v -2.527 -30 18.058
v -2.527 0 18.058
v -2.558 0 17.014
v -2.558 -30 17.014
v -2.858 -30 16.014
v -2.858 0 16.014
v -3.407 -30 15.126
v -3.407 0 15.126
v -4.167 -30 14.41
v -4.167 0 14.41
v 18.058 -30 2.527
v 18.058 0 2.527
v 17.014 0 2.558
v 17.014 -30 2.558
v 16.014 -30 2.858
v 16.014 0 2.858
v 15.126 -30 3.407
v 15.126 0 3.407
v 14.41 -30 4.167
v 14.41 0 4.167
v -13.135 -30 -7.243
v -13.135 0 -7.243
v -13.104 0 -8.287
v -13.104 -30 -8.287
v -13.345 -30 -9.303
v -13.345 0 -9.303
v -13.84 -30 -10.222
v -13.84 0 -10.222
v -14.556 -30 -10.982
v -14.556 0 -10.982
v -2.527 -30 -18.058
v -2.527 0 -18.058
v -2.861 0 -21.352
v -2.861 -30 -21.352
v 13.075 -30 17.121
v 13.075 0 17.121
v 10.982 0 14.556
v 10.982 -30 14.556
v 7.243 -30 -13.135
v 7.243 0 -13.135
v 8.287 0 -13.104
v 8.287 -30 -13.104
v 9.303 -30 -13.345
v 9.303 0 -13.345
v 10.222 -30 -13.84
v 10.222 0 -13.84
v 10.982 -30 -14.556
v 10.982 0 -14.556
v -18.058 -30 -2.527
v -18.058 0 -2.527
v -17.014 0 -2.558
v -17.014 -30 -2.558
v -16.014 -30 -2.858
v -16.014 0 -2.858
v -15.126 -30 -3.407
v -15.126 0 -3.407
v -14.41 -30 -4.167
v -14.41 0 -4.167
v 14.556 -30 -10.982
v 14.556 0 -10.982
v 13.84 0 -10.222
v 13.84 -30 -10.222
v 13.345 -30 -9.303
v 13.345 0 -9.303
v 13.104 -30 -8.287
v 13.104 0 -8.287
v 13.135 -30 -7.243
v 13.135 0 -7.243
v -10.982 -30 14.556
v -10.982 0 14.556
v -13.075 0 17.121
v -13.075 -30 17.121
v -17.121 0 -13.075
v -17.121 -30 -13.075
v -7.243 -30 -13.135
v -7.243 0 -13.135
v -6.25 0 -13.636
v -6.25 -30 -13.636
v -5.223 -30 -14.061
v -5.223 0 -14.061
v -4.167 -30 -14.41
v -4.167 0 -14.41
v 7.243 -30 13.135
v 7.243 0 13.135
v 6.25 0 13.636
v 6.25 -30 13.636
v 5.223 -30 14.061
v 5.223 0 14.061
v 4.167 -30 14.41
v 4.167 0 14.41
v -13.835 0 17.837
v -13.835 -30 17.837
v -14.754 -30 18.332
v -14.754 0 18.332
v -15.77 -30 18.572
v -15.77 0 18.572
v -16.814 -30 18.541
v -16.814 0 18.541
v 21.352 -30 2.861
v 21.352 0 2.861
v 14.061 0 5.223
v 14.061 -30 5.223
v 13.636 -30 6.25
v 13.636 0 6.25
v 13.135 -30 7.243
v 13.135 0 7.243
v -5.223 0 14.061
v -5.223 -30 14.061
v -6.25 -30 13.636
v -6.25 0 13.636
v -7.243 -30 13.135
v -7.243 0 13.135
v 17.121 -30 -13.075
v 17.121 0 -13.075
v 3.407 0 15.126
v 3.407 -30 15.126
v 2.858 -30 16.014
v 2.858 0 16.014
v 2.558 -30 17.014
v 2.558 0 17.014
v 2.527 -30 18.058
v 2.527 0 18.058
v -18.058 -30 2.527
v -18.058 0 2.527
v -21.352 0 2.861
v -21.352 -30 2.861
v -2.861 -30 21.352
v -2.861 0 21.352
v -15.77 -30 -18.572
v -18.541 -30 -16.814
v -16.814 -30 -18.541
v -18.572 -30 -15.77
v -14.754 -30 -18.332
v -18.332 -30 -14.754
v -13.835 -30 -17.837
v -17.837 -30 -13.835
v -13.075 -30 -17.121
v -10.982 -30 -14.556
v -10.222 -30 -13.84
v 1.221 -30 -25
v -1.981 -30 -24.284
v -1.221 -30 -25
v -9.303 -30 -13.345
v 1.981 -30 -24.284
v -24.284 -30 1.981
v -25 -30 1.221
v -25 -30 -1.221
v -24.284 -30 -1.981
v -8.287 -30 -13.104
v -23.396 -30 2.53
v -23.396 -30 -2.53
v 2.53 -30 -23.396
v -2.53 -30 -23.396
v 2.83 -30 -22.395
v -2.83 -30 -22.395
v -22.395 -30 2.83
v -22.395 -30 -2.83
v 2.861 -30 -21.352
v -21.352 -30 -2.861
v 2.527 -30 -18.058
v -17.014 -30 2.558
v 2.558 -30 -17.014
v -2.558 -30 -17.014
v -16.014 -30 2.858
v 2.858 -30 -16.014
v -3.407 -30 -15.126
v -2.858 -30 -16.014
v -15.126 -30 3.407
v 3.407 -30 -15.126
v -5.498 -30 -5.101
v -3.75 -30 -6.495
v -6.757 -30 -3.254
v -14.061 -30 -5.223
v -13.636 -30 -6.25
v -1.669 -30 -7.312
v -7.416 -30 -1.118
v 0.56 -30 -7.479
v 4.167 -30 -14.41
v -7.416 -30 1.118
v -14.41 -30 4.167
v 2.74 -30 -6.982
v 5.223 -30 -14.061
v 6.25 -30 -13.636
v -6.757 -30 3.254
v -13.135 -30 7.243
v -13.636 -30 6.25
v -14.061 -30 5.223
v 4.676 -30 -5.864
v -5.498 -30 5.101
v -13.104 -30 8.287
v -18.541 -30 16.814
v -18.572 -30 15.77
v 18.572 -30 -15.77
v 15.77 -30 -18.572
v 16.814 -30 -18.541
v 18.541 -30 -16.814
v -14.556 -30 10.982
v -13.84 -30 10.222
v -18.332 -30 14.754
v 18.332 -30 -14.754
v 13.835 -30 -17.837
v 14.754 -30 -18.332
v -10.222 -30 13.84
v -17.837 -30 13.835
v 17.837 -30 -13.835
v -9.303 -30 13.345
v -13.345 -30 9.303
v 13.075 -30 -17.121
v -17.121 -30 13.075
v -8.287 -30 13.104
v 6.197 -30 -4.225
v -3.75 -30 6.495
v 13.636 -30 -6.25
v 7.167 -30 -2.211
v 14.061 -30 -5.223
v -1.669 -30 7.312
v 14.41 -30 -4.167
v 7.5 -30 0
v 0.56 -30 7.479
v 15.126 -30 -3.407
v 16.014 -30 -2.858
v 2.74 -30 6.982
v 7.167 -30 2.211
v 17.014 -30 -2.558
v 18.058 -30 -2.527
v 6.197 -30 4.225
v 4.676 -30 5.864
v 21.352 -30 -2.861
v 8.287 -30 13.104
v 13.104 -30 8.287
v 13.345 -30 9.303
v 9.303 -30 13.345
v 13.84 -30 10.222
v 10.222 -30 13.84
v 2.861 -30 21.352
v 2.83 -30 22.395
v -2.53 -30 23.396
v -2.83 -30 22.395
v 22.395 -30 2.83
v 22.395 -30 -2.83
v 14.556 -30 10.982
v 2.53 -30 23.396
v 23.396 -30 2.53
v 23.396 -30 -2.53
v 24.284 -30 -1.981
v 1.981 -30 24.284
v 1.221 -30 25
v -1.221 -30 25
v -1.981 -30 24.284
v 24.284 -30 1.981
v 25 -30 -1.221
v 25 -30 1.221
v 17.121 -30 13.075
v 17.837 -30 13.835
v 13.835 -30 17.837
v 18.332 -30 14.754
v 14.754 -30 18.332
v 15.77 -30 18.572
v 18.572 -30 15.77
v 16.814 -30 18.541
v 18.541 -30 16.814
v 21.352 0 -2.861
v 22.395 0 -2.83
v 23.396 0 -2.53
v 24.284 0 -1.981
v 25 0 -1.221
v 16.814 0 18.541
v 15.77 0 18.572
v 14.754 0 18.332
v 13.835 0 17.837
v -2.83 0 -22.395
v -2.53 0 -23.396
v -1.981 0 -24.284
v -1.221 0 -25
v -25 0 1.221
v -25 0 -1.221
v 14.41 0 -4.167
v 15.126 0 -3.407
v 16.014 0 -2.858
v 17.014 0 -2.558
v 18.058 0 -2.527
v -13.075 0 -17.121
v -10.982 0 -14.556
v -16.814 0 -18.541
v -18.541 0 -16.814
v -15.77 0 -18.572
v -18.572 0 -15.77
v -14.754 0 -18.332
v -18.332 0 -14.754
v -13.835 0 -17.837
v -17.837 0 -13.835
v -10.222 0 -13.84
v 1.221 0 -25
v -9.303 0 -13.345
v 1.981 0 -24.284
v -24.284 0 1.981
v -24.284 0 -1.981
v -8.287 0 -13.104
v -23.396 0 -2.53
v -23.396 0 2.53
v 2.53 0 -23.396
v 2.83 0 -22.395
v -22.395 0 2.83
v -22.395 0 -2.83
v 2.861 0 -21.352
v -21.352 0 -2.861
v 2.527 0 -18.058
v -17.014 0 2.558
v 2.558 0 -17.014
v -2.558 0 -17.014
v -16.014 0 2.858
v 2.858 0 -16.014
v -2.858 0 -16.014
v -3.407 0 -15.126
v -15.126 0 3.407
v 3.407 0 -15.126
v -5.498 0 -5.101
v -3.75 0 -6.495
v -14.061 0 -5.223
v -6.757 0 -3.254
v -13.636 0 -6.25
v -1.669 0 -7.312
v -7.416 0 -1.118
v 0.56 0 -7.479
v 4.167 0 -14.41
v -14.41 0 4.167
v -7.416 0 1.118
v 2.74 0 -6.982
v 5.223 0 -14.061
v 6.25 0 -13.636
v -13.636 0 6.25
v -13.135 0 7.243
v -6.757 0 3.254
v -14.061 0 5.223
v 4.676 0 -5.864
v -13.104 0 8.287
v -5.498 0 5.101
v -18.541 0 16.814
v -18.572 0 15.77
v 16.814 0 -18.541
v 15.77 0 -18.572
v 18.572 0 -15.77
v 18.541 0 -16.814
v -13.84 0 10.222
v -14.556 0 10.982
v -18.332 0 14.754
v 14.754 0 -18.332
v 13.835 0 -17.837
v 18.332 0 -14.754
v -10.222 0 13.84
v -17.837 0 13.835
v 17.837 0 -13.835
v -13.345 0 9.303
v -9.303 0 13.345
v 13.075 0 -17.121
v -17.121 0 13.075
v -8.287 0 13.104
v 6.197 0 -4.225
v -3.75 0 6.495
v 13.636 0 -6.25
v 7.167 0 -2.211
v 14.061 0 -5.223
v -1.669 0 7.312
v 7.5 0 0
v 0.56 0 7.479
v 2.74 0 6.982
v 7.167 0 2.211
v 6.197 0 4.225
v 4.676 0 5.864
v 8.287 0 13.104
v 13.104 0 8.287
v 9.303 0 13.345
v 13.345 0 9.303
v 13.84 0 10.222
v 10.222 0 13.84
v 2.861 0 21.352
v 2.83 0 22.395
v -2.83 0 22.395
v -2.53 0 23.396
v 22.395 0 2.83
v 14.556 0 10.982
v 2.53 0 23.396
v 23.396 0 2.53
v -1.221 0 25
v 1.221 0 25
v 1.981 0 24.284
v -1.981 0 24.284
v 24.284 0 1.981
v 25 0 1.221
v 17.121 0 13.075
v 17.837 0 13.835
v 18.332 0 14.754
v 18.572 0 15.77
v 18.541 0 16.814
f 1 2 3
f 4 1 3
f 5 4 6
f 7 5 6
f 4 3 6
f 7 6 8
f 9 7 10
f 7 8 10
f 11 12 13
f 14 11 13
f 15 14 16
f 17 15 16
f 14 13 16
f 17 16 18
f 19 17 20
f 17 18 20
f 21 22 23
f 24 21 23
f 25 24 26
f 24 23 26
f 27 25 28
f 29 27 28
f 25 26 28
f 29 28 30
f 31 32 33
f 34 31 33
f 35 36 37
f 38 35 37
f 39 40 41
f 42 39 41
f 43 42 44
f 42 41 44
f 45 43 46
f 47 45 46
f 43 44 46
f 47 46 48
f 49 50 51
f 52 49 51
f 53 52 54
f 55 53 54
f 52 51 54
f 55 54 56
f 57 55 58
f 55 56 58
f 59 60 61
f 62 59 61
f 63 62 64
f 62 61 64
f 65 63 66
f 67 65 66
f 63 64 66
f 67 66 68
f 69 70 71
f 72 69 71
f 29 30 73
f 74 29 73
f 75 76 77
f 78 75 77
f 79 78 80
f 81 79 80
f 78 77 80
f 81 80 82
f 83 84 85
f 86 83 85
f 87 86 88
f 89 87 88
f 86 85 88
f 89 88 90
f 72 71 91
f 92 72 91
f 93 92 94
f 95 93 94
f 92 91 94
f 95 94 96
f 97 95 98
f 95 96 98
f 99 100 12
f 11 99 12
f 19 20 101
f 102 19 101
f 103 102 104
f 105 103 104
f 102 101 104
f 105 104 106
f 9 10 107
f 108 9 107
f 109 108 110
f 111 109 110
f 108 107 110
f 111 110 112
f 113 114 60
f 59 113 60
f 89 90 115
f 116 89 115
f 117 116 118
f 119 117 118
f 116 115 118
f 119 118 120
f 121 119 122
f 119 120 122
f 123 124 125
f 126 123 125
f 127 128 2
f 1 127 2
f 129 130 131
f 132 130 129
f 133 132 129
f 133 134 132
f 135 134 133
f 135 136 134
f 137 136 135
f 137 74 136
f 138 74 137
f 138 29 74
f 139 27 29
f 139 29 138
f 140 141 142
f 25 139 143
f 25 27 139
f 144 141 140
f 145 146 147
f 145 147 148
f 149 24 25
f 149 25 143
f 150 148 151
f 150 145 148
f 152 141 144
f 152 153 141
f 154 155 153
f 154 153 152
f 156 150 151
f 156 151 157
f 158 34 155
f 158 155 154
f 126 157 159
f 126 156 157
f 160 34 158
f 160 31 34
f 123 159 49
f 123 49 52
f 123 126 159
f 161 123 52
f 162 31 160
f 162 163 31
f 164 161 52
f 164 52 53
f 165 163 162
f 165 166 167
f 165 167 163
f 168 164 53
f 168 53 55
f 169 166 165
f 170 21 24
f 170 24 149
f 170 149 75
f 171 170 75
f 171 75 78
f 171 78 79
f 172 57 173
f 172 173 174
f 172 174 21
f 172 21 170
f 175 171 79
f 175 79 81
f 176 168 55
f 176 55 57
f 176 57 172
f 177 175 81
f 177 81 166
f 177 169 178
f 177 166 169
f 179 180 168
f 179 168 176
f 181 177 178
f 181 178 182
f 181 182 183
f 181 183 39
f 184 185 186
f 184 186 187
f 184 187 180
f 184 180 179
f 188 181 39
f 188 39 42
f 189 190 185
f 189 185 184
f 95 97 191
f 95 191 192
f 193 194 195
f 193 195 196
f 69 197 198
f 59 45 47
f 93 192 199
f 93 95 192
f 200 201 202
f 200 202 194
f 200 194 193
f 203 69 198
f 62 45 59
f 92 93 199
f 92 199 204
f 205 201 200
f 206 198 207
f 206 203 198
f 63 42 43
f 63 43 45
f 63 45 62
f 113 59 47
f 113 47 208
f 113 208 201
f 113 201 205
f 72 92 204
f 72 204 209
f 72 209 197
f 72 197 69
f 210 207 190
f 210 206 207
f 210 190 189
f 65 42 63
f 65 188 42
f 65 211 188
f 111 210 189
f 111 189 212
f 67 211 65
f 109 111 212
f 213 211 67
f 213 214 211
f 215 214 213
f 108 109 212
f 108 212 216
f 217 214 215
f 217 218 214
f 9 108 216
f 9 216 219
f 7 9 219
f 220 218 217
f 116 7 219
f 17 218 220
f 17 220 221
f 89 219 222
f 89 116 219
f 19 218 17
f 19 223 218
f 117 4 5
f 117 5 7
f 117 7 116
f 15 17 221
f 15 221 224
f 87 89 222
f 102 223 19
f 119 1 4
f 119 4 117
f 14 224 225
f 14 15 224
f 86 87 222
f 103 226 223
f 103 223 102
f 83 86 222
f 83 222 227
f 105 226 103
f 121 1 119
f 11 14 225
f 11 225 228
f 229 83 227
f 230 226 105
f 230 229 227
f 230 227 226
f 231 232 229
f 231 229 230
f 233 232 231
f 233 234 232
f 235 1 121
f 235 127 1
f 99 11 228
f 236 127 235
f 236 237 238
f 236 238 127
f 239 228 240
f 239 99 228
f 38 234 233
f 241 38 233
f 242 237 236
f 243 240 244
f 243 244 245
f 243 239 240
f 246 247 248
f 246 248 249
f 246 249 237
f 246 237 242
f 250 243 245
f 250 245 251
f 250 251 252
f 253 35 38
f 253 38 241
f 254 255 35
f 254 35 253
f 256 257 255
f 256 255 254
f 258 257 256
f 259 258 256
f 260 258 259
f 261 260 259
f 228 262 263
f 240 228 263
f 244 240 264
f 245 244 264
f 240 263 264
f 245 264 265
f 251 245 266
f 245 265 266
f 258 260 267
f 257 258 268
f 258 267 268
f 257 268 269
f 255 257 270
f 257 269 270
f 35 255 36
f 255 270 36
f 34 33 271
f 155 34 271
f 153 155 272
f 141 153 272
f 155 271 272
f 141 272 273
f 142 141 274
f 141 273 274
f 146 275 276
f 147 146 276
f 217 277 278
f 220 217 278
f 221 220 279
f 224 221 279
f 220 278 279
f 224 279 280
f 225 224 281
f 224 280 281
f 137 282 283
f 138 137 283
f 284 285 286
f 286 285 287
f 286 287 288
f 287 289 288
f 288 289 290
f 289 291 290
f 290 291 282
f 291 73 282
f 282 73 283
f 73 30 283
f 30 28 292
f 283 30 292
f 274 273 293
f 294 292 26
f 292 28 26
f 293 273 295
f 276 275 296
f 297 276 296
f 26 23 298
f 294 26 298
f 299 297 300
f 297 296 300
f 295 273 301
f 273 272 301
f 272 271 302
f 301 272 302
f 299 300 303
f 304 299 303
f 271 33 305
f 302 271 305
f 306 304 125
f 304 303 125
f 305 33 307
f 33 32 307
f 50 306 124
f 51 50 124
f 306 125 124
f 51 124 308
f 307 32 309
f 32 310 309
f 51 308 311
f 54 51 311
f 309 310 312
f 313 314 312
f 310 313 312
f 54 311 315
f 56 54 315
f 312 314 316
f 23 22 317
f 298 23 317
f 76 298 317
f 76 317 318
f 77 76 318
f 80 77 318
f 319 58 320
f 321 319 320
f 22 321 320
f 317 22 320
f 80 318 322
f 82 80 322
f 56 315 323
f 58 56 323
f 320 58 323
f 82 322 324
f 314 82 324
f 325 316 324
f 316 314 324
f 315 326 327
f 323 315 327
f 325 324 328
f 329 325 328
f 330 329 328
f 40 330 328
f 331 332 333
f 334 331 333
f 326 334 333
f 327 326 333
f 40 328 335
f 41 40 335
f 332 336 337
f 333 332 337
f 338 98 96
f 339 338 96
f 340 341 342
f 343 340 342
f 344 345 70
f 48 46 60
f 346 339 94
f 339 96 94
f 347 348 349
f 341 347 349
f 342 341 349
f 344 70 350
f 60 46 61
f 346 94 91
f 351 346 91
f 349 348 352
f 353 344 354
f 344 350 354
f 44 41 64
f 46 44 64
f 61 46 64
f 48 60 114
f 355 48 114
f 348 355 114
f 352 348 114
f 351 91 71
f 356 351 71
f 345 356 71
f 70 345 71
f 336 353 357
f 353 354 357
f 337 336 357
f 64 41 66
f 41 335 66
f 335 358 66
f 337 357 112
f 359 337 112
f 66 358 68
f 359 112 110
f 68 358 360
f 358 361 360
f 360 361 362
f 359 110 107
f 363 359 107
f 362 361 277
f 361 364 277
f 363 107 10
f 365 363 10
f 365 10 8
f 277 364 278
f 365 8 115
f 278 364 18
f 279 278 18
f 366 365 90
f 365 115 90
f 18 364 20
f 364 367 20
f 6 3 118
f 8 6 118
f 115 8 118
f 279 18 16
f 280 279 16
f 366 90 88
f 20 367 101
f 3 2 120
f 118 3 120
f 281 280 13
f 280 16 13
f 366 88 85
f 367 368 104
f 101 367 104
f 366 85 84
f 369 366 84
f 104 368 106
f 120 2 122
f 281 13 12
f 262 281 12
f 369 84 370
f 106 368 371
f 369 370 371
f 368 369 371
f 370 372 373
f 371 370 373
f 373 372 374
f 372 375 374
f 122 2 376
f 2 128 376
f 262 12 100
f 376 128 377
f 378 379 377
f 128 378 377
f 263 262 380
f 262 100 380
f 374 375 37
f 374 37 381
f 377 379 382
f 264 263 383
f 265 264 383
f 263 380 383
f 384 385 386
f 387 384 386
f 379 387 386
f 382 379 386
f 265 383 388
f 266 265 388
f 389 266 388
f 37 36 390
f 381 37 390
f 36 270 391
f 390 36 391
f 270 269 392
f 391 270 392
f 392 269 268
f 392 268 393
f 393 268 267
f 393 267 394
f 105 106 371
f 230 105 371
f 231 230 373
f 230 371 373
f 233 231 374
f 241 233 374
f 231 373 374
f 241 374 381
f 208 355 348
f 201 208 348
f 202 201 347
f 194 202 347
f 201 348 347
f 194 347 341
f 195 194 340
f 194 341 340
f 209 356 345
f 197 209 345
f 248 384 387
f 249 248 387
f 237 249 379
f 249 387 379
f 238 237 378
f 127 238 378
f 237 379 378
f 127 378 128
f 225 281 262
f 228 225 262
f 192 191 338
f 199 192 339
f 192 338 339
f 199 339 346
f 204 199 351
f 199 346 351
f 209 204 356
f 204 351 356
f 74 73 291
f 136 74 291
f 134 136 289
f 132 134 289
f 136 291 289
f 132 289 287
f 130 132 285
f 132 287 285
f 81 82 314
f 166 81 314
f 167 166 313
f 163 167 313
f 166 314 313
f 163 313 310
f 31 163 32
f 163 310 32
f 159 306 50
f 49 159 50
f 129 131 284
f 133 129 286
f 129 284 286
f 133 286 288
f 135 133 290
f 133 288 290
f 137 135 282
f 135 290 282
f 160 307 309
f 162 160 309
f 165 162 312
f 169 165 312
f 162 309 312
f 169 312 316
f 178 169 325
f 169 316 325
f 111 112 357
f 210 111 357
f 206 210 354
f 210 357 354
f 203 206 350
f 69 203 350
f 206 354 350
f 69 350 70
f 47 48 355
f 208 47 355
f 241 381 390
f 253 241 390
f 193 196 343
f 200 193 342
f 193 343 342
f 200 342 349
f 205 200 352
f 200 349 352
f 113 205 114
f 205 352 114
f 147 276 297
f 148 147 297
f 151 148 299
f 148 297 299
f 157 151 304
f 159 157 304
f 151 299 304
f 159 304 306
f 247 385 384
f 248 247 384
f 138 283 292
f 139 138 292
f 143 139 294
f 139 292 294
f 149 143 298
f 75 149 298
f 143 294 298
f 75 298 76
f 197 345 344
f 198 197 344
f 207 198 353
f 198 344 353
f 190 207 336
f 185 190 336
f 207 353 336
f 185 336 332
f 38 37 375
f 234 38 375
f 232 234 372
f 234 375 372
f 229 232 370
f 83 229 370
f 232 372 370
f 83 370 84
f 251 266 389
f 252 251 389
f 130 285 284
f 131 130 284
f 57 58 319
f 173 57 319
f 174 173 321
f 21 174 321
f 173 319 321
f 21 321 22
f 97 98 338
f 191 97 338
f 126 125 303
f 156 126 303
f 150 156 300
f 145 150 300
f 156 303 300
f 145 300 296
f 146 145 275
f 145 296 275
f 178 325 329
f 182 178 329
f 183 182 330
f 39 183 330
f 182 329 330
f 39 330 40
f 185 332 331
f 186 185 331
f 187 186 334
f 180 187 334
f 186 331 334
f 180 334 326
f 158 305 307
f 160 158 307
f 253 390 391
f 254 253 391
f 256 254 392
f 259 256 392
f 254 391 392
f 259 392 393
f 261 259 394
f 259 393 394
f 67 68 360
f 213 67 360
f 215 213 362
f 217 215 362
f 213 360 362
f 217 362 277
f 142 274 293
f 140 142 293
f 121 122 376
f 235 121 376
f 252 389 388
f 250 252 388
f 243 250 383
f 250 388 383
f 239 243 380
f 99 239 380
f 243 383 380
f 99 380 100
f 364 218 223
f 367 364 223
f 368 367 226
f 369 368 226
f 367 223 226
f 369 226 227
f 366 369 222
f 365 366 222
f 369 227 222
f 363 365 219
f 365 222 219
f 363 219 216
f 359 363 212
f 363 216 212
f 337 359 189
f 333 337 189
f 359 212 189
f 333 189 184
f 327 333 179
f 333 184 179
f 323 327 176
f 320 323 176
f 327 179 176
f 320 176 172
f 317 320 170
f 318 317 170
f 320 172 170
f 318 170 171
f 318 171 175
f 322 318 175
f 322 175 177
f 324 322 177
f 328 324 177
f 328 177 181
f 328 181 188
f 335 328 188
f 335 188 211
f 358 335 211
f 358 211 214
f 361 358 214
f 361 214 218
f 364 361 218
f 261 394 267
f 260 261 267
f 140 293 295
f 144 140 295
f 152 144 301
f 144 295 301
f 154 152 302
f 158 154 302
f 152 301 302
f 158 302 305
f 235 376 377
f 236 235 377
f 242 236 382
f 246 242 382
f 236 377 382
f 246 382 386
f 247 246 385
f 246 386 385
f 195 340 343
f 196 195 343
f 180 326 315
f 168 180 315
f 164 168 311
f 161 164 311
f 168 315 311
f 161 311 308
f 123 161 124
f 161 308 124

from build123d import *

# Parameters (mm, degrees)
F1_DEPTH = 30
F2_R     = 7.5
F3_DEPTH = 30.001


with BuildPart() as f1:
    # F0 (on Front) → F1 (new body)
    with BuildSketch(Plane.XZ):
        with BuildLine():
            ThreePointArc((-14.555619, 10.982389), (-13.34453, 9.30297), (-13.135405, 7.243005))
            ThreePointArc((-13.135405, 7.243005), (-13.858193, 5.740251), (-14.409712, 4.166556))
            ThreePointArc((-14.409712, 4.166556), (-16.0142, 2.857814), (-18.058099, 2.526655))
            Line((-18.058099, 2.526655), (-21.351614, 2.861007))
            ThreePointArc((-21.351614, 2.861007), (-23.395512, 2.529847), (-25, 1.221105))
            Line((-25, 1.221105), (-25, -1.221105))
            ThreePointArc((-25, -1.221105), (-23.395512, -2.529847), (-21.351614, -2.861007))
            Line((-21.351614, -2.861007), (-18.058099, -2.526655))
            ThreePointArc((-18.058099, -2.526655), (-16.0142, -2.857814), (-14.409712, -4.166556))
            ThreePointArc((-14.409712, -4.166556), (-13.858193, -5.740251), (-13.135405, -7.243005))
            ThreePointArc((-13.135405, -7.243005), (-13.34453, -9.30297), (-14.555619, -10.982389))
            Line((-14.555619, -10.982389), (-17.120908, -13.074834))
            ThreePointArc((-17.120908, -13.074834), (-18.331997, -14.754253), (-18.541121, -16.814218))
            Line((-18.541121, -16.814218), (-16.814218, -18.541121))
            ThreePointArc((-16.814218, -18.541121), (-14.754253, -18.331997), (-13.074834, -17.120908))
            Line((-13.074834, -17.120908), (-10.982389, -14.555619))
            ThreePointArc((-10.982389, -14.555619), (-9.30297, -13.34453), (-7.243005, -13.135405))
            ThreePointArc((-7.243005, -13.135405), (-5.740251, -13.858193), (-4.166556, -14.409712))
            ThreePointArc((-4.166556, -14.409712), (-2.857814, -16.0142), (-2.526655, -18.058099))
            Line((-2.526655, -18.058099), (-2.861007, -21.351614))
            ThreePointArc((-2.861007, -21.351614), (-2.529847, -23.395512), (-1.221105, -25))
            Line((-1.221105, -25), (1.221105, -25))
            ThreePointArc((1.221105, -25), (2.529847, -23.395512), (2.861007, -21.351614))
            Line((2.861007, -21.351614), (2.526655, -18.058099))
            ThreePointArc((2.526655, -18.058099), (2.857814, -16.0142), (4.166556, -14.409712))
            ThreePointArc((4.166556, -14.409712), (5.740251, -13.858193), (7.243005, -13.135405))
            ThreePointArc((7.243005, -13.135405), (9.30297, -13.34453), (10.982389, -14.555619))
            Line((10.982389, -14.555619), (13.074834, -17.120908))
            ThreePointArc((13.074834, -17.120908), (14.754253, -18.331997), (16.814218, -18.541121))
            Line((16.814218, -18.541121), (18.541121, -16.814218))
            ThreePointArc((18.541121, -16.814218), (18.331997, -14.754253), (17.120908, -13.074834))
            Line((17.120908, -13.074834), (14.555619, -10.982389))
            ThreePointArc((14.555619, -10.982389), (13.34453, -9.30297), (13.135405, -7.243005))
            ThreePointArc((13.135405, -7.243005), (13.858193, -5.740251), (14.409712, -4.166556))
            ThreePointArc((14.409712, -4.166556), (16.0142, -2.857814), (18.058099, -2.526655))
            Line((18.058099, -2.526655), (21.351614, -2.861007))
            ThreePointArc((21.351614, -2.861007), (23.395512, -2.529847), (25, -1.221105))
            Line((25, -1.221105), (25, 1.221105))
            ThreePointArc((25, 1.221105), (23.395512, 2.529847), (21.351614, 2.861007))
            Line((21.351614, 2.861007), (18.058099, 2.526655))
            ThreePointArc((18.058099, 2.526655), (16.0142, 2.857814), (14.409712, 4.166556))
            ThreePointArc((14.409712, 4.166556), (13.858193, 5.740251), (13.135405, 7.243005))
            ThreePointArc((13.135405, 7.243005), (13.34453, 9.30297), (14.555619, 10.982389))
            Line((14.555619, 10.982389), (17.120908, 13.074834))
            ThreePointArc((17.120908, 13.074834), (18.331997, 14.754253), (18.541121, 16.814218))
            Line((18.541121, 16.814218), (16.814218, 18.541121))
            ThreePointArc((16.814218, 18.541121), (14.754253, 18.331997), (13.074834, 17.120908))
            Line((13.074834, 17.120908), (10.982389, 14.555619))
            ThreePointArc((10.982389, 14.555619), (9.30297, 13.34453), (7.243005, 13.135405))
            ThreePointArc((7.243005, 13.135405), (5.740251, 13.858193), (4.166556, 14.409712))
            ThreePointArc((4.166556, 14.409712), (2.857814, 16.0142), (2.526655, 18.058099))
            Line((2.526655, 18.058099), (2.861007, 21.351614))
            ThreePointArc((2.861007, 21.351614), (2.529847, 23.395512), (1.221105, 25))
            Line((1.221105, 25), (-1.221105, 25))
            ThreePointArc((-1.221105, 25), (-2.529847, 23.395512), (-2.861007, 21.351614))
            Line((-2.861007, 21.351614), (-2.526655, 18.058099))
            ThreePointArc((-2.526655, 18.058099), (-2.857814, 16.0142), (-4.166556, 14.409712))
            ThreePointArc((-4.166556, 14.409712), (-5.740251, 13.858193), (-7.243005, 13.135405))
            ThreePointArc((-7.243005, 13.135405), (-9.30297, 13.34453), (-10.982389, 14.555619))
            Line((-10.982389, 14.555619), (-13.074834, 17.120908))
            ThreePointArc((-13.074834, 17.120908), (-14.754253, 18.331997), (-16.814218, 18.541121))
            Line((-16.814218, 18.541121), (-18.541121, 16.814218))
            ThreePointArc((-18.541121, 16.814218), (-18.331997, 14.754253), (-17.120908, 13.074834))
            Line((-17.120908, 13.074834), (-14.555619, 10.982389))
        make_face()
    extrude(amount=F1_DEPTH)

    # F2 (on face) → F3 (cut, through all)
    with BuildSketch(Plane.XZ.offset(30)):
        Circle(F2_R)
    extrude(amount=-F3_DEPTH, mode=Mode.SUBTRACT)


solid = f1.part
